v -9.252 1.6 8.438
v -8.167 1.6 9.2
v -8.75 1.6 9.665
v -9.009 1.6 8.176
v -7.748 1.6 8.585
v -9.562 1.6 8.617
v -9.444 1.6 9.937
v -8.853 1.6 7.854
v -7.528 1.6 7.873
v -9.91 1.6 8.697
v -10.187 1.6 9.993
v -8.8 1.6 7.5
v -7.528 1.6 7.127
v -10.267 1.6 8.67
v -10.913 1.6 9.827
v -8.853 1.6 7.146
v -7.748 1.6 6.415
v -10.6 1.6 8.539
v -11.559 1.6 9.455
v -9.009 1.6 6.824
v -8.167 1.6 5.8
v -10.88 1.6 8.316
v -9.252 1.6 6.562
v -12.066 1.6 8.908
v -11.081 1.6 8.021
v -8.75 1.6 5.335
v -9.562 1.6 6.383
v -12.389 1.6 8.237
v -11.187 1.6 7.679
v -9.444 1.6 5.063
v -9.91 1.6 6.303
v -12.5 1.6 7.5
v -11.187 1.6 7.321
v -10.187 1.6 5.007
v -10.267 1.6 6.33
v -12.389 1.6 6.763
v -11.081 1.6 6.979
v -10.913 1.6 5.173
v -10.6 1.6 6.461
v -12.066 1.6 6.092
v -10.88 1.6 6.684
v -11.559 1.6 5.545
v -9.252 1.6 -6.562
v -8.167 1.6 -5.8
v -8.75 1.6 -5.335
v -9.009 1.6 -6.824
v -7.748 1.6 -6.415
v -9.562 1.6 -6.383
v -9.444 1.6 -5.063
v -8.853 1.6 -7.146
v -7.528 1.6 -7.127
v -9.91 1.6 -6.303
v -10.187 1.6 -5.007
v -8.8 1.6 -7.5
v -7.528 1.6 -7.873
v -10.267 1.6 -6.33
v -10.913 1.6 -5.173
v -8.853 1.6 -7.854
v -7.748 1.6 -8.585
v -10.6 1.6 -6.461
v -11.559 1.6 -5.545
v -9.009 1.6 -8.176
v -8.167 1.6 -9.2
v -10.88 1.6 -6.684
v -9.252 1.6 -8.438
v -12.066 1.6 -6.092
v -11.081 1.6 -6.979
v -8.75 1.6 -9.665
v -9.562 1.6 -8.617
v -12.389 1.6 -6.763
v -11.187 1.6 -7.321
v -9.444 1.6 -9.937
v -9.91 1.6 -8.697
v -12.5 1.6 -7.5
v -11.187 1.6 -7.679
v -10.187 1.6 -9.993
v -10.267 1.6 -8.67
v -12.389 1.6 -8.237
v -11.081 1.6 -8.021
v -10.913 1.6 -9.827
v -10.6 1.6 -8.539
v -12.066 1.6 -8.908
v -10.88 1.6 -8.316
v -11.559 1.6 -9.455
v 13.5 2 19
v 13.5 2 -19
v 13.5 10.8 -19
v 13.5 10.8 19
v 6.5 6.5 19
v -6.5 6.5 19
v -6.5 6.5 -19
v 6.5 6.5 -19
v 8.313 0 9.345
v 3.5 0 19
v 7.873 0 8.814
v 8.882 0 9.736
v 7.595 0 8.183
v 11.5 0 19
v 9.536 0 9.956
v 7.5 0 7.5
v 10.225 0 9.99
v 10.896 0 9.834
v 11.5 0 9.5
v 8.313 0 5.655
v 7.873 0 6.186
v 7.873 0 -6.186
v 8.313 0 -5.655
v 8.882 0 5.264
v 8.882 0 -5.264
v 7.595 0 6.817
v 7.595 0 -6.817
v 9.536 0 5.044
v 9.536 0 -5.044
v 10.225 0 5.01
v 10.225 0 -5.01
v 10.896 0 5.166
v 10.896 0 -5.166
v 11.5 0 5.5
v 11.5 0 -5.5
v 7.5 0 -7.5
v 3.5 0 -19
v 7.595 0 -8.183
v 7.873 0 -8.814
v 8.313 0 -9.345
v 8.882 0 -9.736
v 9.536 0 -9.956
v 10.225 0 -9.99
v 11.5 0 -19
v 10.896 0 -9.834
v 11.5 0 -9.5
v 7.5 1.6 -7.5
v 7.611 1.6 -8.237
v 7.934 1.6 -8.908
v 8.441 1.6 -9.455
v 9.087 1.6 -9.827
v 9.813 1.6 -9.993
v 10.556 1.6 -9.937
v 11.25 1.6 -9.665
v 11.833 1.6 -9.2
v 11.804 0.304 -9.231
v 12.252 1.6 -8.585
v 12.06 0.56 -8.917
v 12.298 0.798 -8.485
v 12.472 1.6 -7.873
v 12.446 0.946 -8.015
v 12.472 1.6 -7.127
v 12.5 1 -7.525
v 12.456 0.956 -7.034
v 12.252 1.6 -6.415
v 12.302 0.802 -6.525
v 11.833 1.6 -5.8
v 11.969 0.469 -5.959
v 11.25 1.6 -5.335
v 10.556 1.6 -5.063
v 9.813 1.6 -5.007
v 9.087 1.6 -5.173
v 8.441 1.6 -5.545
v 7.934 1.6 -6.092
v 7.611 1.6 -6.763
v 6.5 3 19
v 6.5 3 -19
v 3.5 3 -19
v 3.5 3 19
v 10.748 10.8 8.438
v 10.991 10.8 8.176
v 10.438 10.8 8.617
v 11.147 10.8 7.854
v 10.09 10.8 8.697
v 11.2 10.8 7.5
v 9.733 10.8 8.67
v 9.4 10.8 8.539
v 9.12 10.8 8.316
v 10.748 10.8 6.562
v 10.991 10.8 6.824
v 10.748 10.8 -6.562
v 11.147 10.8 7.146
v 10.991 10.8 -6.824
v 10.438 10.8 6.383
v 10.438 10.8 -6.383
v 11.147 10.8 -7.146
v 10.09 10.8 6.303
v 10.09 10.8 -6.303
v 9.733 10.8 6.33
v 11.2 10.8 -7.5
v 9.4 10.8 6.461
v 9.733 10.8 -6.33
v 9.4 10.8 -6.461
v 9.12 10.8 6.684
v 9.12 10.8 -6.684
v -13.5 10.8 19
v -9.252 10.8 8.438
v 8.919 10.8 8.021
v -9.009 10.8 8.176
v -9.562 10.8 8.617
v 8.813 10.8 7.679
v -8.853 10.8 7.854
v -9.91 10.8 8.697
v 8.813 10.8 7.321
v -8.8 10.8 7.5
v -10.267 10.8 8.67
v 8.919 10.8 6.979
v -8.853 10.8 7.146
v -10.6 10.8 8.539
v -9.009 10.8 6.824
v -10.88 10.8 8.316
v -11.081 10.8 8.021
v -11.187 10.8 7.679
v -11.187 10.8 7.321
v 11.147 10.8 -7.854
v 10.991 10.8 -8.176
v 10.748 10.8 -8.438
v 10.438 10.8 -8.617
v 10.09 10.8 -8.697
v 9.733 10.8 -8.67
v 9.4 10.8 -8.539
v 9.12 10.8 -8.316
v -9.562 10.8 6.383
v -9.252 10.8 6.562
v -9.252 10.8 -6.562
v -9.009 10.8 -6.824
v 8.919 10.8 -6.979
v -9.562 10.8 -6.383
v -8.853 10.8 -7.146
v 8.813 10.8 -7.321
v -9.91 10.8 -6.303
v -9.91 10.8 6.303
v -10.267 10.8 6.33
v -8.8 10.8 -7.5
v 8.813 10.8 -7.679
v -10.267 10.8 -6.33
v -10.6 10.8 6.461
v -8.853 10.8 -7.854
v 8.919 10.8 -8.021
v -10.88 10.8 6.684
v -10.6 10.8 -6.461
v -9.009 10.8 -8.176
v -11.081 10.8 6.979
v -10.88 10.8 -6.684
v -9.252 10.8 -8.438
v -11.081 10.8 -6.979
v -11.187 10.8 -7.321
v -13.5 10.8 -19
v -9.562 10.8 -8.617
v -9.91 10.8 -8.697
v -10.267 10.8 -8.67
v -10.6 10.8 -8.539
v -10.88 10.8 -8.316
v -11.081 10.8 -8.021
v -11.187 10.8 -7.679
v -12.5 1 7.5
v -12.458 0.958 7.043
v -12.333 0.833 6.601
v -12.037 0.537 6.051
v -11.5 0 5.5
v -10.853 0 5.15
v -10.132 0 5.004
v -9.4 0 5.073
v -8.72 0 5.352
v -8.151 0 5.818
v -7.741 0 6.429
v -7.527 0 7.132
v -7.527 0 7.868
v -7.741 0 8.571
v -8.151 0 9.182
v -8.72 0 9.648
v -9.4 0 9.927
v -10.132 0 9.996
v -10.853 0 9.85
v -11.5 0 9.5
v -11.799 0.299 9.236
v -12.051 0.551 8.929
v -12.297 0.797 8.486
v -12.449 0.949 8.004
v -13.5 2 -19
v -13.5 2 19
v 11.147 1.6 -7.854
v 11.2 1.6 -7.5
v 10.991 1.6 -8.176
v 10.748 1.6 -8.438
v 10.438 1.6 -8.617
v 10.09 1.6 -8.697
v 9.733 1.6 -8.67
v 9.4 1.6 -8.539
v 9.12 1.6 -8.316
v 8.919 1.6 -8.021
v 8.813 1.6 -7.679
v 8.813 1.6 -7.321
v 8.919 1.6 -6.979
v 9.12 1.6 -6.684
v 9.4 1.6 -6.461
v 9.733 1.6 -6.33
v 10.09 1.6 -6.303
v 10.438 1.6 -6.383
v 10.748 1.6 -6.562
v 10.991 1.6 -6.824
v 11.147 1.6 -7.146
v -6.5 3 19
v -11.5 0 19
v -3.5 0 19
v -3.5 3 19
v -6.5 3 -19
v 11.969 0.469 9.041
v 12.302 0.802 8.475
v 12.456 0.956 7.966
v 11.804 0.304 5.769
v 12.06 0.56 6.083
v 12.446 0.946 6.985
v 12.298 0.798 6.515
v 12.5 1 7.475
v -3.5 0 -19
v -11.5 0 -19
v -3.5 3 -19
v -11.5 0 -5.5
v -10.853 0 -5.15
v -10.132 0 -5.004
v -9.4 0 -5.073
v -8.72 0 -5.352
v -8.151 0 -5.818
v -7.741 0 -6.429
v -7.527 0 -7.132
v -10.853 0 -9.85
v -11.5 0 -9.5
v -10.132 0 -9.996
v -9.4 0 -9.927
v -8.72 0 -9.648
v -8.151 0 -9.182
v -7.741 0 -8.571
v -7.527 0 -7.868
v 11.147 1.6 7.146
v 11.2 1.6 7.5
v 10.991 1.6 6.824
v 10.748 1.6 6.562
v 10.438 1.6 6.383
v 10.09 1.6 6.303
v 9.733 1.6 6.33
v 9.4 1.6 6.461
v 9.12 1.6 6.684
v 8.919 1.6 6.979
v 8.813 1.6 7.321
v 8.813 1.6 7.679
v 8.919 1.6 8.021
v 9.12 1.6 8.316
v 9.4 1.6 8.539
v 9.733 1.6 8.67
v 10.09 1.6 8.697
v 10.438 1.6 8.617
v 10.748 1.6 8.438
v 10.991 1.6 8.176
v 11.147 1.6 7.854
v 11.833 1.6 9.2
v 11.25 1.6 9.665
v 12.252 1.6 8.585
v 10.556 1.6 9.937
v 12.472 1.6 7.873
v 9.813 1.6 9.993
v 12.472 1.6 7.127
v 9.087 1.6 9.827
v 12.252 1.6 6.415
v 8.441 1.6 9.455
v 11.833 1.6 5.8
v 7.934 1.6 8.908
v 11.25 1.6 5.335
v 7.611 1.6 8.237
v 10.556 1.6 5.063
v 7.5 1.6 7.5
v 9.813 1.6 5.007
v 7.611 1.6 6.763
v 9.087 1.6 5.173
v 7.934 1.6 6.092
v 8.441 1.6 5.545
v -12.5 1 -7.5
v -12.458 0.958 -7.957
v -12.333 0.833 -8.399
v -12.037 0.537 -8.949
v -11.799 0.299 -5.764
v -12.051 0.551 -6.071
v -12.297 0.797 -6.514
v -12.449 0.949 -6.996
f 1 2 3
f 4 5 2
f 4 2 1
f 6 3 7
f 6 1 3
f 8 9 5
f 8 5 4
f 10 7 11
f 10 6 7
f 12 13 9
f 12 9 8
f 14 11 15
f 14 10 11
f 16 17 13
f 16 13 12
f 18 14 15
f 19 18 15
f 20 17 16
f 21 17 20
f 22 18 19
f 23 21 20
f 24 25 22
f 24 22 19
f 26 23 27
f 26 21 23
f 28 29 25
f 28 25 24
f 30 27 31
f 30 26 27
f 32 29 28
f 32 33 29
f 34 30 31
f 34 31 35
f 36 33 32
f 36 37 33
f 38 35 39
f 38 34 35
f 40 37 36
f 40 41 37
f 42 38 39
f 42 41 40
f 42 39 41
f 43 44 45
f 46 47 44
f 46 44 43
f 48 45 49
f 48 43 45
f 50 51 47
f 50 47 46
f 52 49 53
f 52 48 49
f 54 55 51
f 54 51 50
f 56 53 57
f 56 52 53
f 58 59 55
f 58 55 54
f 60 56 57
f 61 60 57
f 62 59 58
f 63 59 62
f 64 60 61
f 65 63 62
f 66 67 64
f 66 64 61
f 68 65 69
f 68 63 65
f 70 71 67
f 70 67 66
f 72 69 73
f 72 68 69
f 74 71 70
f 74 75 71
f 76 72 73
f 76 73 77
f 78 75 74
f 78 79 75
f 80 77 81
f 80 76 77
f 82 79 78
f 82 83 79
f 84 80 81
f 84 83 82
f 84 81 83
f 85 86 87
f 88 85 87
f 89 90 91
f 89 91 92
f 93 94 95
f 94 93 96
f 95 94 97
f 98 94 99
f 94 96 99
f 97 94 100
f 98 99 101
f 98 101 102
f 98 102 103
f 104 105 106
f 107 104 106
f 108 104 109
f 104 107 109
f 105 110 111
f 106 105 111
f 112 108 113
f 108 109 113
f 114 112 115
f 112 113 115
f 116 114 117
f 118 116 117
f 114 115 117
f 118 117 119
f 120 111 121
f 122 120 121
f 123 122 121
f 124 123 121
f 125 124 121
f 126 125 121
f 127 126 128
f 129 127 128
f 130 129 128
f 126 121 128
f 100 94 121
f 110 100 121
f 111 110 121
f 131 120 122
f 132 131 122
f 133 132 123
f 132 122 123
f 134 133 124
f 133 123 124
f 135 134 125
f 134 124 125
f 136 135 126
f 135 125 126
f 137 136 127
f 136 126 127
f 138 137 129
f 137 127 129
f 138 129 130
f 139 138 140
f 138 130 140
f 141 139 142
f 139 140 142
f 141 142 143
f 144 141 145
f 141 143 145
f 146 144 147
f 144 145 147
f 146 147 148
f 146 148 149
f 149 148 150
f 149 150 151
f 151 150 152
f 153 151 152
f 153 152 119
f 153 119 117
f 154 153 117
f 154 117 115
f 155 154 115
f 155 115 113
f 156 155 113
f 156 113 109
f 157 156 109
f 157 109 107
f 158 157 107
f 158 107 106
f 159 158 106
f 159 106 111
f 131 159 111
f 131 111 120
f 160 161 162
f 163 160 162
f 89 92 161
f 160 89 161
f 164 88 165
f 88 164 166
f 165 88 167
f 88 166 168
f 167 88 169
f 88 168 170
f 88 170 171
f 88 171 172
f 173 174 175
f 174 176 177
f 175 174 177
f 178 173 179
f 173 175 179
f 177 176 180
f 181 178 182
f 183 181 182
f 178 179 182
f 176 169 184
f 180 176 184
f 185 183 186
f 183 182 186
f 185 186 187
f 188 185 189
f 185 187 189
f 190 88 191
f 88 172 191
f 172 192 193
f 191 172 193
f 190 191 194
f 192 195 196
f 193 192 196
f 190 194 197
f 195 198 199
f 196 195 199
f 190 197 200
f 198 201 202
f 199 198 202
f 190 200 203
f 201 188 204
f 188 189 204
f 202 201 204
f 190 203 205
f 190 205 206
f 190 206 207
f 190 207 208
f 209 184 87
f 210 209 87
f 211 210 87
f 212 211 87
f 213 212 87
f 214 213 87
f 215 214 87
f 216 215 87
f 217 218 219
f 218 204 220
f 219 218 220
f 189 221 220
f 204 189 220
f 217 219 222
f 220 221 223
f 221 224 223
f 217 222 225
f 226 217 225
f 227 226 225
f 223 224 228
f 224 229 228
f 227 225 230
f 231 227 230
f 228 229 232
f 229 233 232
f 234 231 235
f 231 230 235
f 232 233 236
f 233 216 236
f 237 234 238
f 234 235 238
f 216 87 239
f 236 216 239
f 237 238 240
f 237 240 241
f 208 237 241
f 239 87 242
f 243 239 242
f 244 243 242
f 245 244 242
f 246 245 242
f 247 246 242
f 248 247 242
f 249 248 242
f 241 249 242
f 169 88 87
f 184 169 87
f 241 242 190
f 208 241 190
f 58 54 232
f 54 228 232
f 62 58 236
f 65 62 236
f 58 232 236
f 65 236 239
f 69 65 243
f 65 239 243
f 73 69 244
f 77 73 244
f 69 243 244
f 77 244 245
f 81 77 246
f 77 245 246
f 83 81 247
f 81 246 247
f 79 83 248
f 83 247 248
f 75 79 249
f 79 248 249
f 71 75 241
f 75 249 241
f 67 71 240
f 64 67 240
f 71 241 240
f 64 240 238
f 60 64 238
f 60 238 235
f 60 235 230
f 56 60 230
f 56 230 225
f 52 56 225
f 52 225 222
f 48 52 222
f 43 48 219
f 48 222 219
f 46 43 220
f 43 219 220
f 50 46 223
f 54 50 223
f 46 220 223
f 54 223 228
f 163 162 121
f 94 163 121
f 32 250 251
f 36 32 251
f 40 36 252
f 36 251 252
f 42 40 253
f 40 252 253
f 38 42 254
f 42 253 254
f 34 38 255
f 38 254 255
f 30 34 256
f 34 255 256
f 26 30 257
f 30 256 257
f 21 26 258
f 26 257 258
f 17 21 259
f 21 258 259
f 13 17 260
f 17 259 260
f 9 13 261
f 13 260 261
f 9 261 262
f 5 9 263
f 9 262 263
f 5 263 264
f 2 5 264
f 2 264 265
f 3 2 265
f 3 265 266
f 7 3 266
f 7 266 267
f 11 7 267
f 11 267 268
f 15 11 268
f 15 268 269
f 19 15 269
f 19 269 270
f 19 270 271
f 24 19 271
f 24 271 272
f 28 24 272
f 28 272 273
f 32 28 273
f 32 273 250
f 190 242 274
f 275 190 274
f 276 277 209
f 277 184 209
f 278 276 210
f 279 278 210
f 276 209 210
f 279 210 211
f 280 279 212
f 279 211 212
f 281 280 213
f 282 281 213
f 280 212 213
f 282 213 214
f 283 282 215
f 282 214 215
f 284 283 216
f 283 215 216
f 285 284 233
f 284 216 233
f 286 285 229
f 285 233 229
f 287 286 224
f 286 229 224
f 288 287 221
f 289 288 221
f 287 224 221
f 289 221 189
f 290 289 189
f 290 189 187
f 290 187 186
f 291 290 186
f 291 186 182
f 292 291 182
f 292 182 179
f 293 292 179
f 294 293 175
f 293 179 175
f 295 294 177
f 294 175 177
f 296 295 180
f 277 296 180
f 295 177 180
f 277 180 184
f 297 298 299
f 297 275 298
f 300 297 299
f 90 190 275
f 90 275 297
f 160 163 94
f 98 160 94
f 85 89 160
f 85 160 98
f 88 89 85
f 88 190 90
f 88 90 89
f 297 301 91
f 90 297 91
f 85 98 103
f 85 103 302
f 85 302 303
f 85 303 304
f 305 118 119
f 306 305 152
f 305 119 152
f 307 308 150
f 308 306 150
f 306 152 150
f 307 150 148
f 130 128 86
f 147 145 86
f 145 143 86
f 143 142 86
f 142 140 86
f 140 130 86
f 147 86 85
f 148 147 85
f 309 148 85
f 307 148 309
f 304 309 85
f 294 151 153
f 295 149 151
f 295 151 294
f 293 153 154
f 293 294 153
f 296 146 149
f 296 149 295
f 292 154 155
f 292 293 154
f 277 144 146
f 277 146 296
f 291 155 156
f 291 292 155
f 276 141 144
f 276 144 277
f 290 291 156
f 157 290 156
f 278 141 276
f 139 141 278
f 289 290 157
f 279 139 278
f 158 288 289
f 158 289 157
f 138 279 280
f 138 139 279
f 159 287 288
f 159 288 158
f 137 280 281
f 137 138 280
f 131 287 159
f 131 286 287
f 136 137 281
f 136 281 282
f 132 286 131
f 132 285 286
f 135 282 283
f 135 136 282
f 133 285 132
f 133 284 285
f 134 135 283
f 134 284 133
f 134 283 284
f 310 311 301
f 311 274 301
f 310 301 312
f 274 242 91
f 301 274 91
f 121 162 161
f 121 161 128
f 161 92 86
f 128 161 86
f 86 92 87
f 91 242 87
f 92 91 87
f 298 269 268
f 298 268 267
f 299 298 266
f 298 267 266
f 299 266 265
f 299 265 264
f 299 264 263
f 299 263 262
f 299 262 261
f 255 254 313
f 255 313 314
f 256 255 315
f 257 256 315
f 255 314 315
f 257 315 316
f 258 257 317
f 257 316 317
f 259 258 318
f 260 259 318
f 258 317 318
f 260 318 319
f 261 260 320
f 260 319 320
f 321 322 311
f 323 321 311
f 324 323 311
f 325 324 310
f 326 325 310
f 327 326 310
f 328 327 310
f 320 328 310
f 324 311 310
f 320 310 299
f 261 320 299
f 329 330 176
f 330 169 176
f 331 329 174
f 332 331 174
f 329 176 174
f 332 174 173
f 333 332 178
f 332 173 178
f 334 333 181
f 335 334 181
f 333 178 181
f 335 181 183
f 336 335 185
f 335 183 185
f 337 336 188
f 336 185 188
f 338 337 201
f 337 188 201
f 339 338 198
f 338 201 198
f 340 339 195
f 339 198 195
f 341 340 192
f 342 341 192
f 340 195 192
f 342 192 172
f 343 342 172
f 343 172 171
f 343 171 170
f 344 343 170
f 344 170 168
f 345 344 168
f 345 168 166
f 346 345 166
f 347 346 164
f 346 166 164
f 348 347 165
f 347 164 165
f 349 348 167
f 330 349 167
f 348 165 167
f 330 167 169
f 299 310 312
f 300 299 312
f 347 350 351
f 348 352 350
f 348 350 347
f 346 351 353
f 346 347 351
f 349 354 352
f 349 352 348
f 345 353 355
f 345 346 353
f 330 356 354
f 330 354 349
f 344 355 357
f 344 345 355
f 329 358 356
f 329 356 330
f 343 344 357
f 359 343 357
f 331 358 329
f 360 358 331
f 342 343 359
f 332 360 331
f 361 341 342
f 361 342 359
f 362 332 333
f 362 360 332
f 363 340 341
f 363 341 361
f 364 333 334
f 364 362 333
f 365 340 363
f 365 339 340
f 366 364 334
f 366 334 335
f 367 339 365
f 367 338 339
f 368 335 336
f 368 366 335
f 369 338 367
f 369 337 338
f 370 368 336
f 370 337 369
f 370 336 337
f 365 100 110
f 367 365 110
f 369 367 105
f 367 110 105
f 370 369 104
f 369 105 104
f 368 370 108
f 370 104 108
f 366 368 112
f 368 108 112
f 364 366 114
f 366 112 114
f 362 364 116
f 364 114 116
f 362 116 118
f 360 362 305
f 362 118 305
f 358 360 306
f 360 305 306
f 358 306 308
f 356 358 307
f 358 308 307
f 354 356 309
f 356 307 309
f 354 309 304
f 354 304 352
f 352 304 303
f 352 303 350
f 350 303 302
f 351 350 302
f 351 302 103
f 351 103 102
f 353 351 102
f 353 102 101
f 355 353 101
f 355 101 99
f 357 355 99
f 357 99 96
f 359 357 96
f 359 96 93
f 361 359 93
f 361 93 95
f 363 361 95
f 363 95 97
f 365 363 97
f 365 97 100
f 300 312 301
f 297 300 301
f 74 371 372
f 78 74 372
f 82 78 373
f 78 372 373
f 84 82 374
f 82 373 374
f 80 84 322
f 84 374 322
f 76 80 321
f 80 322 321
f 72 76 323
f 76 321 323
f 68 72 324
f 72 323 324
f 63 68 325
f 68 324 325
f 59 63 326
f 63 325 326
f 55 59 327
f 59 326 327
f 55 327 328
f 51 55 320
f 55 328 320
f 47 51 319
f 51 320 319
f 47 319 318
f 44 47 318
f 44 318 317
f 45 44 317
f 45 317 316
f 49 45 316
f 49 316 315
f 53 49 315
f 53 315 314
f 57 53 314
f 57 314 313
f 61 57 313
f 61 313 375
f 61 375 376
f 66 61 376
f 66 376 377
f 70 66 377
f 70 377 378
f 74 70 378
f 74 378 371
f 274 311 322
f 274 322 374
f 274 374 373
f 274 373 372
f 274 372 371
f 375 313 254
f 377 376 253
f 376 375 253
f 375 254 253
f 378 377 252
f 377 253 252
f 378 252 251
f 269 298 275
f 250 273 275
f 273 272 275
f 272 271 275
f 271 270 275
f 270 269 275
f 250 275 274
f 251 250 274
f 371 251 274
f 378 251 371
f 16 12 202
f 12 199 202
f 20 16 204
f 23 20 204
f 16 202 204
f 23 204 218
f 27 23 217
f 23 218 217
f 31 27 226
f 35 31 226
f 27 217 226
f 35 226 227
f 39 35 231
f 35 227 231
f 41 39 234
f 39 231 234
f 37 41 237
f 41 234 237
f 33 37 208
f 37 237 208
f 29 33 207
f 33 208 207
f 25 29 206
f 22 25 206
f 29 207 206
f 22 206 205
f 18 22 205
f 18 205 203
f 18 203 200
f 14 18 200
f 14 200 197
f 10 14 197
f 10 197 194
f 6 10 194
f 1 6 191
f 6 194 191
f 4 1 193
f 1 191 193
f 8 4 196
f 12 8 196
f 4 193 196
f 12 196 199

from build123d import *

# Parameters (mm, degrees)
AUFSATZ_LINEAR_AUSTRAGEN1_DEPTH                      = 19
AUFSATZ_LINEAR_AUSTRAGEN1_DEPTH_BACK                 = 19
STIRNSENKUNG_F_R_M2_FLACHKOPFSCHRAUBE_MI_D           = 2.4
STIRNSENKUNG_F_R_M2_FLACHKOPFSCHRAUBE_MI_CBORE_D     = 5
STIRNSENKUNG_F_R_M2_FLACHKOPFSCHRAUBE_MI_CBORE_DEPTH = 1.6
FASE1_SIZE                                           = 2


with BuildPart() as part:
    # Skizze1 → Aufsatz-Linear austragen1 (new, two sides: drawn at the far end of the back side and taken through both)
    with BuildSketch(Plane.XY.offset(-AUFSATZ_LINEAR_AUSTRAGEN1_DEPTH_BACK)):
        Polygon((-3.5, 0), (-3.5, 3), (-6.5, 3), (-6.5, 6.5), (6.5, 6.5), (6.5, 3), (3.5, 3), (3.5, 0), (13.5, 0), (13.5, 10.8), (-13.5, 10.8), (-13.5, 0), align=None)
    extrude(amount=AUFSATZ_LINEAR_AUSTRAGEN1_DEPTH + AUFSATZ_LINEAR_AUSTRAGEN1_DEPTH_BACK)

    # Stirnsenkung für M2 Flachkopfschraube mit Schlitz1 (through all)
    with Locations(Plane(origin=(0, 0, 0), x_dir=(-1, 0, 0), z_dir=(0, -1, 0))):
        with Locations((-10, -7.5), (-10, 7.5), (10, -7.5), (10, 7.5)):
            CounterBoreHole(STIRNSENKUNG_F_R_M2_FLACHKOPFSCHRAUBE_MI_D / 2, STIRNSENKUNG_F_R_M2_FLACHKOPFSCHRAUBE_MI_CBORE_D / 2, STIRNSENKUNG_F_R_M2_FLACHKOPFSCHRAUBE_MI_CBORE_DEPTH)

    # Fase1
    # the kernel refuses this chamfer: 2 mm, written as the material it takes off along each edge
    with BuildSketch(Plane(origin=(-13.5, 0, 24.143365976), x_dir=(0.9996219169112968, -0.027495876610586598, 0), z_dir=(0, 0, -1)), Plane(origin=(13.5, 0, -24.143365976), x_dir=(-0.9996219169112968, -0.027495876610586608, 0), z_dir=(0, 0, 1))) as fase1_piece_1:
        Polygon((FASE1_SIZE * 0.999621916911, -FASE1_SIZE * 0.0274958766106), (-FASE1_SIZE * 0.0274958766106, -FASE1_SIZE * 0.999621916911), (0, 0), align=None)
    extrude(amount=48.286731952, mode=Mode.SUBTRACT)


solid = part.part
